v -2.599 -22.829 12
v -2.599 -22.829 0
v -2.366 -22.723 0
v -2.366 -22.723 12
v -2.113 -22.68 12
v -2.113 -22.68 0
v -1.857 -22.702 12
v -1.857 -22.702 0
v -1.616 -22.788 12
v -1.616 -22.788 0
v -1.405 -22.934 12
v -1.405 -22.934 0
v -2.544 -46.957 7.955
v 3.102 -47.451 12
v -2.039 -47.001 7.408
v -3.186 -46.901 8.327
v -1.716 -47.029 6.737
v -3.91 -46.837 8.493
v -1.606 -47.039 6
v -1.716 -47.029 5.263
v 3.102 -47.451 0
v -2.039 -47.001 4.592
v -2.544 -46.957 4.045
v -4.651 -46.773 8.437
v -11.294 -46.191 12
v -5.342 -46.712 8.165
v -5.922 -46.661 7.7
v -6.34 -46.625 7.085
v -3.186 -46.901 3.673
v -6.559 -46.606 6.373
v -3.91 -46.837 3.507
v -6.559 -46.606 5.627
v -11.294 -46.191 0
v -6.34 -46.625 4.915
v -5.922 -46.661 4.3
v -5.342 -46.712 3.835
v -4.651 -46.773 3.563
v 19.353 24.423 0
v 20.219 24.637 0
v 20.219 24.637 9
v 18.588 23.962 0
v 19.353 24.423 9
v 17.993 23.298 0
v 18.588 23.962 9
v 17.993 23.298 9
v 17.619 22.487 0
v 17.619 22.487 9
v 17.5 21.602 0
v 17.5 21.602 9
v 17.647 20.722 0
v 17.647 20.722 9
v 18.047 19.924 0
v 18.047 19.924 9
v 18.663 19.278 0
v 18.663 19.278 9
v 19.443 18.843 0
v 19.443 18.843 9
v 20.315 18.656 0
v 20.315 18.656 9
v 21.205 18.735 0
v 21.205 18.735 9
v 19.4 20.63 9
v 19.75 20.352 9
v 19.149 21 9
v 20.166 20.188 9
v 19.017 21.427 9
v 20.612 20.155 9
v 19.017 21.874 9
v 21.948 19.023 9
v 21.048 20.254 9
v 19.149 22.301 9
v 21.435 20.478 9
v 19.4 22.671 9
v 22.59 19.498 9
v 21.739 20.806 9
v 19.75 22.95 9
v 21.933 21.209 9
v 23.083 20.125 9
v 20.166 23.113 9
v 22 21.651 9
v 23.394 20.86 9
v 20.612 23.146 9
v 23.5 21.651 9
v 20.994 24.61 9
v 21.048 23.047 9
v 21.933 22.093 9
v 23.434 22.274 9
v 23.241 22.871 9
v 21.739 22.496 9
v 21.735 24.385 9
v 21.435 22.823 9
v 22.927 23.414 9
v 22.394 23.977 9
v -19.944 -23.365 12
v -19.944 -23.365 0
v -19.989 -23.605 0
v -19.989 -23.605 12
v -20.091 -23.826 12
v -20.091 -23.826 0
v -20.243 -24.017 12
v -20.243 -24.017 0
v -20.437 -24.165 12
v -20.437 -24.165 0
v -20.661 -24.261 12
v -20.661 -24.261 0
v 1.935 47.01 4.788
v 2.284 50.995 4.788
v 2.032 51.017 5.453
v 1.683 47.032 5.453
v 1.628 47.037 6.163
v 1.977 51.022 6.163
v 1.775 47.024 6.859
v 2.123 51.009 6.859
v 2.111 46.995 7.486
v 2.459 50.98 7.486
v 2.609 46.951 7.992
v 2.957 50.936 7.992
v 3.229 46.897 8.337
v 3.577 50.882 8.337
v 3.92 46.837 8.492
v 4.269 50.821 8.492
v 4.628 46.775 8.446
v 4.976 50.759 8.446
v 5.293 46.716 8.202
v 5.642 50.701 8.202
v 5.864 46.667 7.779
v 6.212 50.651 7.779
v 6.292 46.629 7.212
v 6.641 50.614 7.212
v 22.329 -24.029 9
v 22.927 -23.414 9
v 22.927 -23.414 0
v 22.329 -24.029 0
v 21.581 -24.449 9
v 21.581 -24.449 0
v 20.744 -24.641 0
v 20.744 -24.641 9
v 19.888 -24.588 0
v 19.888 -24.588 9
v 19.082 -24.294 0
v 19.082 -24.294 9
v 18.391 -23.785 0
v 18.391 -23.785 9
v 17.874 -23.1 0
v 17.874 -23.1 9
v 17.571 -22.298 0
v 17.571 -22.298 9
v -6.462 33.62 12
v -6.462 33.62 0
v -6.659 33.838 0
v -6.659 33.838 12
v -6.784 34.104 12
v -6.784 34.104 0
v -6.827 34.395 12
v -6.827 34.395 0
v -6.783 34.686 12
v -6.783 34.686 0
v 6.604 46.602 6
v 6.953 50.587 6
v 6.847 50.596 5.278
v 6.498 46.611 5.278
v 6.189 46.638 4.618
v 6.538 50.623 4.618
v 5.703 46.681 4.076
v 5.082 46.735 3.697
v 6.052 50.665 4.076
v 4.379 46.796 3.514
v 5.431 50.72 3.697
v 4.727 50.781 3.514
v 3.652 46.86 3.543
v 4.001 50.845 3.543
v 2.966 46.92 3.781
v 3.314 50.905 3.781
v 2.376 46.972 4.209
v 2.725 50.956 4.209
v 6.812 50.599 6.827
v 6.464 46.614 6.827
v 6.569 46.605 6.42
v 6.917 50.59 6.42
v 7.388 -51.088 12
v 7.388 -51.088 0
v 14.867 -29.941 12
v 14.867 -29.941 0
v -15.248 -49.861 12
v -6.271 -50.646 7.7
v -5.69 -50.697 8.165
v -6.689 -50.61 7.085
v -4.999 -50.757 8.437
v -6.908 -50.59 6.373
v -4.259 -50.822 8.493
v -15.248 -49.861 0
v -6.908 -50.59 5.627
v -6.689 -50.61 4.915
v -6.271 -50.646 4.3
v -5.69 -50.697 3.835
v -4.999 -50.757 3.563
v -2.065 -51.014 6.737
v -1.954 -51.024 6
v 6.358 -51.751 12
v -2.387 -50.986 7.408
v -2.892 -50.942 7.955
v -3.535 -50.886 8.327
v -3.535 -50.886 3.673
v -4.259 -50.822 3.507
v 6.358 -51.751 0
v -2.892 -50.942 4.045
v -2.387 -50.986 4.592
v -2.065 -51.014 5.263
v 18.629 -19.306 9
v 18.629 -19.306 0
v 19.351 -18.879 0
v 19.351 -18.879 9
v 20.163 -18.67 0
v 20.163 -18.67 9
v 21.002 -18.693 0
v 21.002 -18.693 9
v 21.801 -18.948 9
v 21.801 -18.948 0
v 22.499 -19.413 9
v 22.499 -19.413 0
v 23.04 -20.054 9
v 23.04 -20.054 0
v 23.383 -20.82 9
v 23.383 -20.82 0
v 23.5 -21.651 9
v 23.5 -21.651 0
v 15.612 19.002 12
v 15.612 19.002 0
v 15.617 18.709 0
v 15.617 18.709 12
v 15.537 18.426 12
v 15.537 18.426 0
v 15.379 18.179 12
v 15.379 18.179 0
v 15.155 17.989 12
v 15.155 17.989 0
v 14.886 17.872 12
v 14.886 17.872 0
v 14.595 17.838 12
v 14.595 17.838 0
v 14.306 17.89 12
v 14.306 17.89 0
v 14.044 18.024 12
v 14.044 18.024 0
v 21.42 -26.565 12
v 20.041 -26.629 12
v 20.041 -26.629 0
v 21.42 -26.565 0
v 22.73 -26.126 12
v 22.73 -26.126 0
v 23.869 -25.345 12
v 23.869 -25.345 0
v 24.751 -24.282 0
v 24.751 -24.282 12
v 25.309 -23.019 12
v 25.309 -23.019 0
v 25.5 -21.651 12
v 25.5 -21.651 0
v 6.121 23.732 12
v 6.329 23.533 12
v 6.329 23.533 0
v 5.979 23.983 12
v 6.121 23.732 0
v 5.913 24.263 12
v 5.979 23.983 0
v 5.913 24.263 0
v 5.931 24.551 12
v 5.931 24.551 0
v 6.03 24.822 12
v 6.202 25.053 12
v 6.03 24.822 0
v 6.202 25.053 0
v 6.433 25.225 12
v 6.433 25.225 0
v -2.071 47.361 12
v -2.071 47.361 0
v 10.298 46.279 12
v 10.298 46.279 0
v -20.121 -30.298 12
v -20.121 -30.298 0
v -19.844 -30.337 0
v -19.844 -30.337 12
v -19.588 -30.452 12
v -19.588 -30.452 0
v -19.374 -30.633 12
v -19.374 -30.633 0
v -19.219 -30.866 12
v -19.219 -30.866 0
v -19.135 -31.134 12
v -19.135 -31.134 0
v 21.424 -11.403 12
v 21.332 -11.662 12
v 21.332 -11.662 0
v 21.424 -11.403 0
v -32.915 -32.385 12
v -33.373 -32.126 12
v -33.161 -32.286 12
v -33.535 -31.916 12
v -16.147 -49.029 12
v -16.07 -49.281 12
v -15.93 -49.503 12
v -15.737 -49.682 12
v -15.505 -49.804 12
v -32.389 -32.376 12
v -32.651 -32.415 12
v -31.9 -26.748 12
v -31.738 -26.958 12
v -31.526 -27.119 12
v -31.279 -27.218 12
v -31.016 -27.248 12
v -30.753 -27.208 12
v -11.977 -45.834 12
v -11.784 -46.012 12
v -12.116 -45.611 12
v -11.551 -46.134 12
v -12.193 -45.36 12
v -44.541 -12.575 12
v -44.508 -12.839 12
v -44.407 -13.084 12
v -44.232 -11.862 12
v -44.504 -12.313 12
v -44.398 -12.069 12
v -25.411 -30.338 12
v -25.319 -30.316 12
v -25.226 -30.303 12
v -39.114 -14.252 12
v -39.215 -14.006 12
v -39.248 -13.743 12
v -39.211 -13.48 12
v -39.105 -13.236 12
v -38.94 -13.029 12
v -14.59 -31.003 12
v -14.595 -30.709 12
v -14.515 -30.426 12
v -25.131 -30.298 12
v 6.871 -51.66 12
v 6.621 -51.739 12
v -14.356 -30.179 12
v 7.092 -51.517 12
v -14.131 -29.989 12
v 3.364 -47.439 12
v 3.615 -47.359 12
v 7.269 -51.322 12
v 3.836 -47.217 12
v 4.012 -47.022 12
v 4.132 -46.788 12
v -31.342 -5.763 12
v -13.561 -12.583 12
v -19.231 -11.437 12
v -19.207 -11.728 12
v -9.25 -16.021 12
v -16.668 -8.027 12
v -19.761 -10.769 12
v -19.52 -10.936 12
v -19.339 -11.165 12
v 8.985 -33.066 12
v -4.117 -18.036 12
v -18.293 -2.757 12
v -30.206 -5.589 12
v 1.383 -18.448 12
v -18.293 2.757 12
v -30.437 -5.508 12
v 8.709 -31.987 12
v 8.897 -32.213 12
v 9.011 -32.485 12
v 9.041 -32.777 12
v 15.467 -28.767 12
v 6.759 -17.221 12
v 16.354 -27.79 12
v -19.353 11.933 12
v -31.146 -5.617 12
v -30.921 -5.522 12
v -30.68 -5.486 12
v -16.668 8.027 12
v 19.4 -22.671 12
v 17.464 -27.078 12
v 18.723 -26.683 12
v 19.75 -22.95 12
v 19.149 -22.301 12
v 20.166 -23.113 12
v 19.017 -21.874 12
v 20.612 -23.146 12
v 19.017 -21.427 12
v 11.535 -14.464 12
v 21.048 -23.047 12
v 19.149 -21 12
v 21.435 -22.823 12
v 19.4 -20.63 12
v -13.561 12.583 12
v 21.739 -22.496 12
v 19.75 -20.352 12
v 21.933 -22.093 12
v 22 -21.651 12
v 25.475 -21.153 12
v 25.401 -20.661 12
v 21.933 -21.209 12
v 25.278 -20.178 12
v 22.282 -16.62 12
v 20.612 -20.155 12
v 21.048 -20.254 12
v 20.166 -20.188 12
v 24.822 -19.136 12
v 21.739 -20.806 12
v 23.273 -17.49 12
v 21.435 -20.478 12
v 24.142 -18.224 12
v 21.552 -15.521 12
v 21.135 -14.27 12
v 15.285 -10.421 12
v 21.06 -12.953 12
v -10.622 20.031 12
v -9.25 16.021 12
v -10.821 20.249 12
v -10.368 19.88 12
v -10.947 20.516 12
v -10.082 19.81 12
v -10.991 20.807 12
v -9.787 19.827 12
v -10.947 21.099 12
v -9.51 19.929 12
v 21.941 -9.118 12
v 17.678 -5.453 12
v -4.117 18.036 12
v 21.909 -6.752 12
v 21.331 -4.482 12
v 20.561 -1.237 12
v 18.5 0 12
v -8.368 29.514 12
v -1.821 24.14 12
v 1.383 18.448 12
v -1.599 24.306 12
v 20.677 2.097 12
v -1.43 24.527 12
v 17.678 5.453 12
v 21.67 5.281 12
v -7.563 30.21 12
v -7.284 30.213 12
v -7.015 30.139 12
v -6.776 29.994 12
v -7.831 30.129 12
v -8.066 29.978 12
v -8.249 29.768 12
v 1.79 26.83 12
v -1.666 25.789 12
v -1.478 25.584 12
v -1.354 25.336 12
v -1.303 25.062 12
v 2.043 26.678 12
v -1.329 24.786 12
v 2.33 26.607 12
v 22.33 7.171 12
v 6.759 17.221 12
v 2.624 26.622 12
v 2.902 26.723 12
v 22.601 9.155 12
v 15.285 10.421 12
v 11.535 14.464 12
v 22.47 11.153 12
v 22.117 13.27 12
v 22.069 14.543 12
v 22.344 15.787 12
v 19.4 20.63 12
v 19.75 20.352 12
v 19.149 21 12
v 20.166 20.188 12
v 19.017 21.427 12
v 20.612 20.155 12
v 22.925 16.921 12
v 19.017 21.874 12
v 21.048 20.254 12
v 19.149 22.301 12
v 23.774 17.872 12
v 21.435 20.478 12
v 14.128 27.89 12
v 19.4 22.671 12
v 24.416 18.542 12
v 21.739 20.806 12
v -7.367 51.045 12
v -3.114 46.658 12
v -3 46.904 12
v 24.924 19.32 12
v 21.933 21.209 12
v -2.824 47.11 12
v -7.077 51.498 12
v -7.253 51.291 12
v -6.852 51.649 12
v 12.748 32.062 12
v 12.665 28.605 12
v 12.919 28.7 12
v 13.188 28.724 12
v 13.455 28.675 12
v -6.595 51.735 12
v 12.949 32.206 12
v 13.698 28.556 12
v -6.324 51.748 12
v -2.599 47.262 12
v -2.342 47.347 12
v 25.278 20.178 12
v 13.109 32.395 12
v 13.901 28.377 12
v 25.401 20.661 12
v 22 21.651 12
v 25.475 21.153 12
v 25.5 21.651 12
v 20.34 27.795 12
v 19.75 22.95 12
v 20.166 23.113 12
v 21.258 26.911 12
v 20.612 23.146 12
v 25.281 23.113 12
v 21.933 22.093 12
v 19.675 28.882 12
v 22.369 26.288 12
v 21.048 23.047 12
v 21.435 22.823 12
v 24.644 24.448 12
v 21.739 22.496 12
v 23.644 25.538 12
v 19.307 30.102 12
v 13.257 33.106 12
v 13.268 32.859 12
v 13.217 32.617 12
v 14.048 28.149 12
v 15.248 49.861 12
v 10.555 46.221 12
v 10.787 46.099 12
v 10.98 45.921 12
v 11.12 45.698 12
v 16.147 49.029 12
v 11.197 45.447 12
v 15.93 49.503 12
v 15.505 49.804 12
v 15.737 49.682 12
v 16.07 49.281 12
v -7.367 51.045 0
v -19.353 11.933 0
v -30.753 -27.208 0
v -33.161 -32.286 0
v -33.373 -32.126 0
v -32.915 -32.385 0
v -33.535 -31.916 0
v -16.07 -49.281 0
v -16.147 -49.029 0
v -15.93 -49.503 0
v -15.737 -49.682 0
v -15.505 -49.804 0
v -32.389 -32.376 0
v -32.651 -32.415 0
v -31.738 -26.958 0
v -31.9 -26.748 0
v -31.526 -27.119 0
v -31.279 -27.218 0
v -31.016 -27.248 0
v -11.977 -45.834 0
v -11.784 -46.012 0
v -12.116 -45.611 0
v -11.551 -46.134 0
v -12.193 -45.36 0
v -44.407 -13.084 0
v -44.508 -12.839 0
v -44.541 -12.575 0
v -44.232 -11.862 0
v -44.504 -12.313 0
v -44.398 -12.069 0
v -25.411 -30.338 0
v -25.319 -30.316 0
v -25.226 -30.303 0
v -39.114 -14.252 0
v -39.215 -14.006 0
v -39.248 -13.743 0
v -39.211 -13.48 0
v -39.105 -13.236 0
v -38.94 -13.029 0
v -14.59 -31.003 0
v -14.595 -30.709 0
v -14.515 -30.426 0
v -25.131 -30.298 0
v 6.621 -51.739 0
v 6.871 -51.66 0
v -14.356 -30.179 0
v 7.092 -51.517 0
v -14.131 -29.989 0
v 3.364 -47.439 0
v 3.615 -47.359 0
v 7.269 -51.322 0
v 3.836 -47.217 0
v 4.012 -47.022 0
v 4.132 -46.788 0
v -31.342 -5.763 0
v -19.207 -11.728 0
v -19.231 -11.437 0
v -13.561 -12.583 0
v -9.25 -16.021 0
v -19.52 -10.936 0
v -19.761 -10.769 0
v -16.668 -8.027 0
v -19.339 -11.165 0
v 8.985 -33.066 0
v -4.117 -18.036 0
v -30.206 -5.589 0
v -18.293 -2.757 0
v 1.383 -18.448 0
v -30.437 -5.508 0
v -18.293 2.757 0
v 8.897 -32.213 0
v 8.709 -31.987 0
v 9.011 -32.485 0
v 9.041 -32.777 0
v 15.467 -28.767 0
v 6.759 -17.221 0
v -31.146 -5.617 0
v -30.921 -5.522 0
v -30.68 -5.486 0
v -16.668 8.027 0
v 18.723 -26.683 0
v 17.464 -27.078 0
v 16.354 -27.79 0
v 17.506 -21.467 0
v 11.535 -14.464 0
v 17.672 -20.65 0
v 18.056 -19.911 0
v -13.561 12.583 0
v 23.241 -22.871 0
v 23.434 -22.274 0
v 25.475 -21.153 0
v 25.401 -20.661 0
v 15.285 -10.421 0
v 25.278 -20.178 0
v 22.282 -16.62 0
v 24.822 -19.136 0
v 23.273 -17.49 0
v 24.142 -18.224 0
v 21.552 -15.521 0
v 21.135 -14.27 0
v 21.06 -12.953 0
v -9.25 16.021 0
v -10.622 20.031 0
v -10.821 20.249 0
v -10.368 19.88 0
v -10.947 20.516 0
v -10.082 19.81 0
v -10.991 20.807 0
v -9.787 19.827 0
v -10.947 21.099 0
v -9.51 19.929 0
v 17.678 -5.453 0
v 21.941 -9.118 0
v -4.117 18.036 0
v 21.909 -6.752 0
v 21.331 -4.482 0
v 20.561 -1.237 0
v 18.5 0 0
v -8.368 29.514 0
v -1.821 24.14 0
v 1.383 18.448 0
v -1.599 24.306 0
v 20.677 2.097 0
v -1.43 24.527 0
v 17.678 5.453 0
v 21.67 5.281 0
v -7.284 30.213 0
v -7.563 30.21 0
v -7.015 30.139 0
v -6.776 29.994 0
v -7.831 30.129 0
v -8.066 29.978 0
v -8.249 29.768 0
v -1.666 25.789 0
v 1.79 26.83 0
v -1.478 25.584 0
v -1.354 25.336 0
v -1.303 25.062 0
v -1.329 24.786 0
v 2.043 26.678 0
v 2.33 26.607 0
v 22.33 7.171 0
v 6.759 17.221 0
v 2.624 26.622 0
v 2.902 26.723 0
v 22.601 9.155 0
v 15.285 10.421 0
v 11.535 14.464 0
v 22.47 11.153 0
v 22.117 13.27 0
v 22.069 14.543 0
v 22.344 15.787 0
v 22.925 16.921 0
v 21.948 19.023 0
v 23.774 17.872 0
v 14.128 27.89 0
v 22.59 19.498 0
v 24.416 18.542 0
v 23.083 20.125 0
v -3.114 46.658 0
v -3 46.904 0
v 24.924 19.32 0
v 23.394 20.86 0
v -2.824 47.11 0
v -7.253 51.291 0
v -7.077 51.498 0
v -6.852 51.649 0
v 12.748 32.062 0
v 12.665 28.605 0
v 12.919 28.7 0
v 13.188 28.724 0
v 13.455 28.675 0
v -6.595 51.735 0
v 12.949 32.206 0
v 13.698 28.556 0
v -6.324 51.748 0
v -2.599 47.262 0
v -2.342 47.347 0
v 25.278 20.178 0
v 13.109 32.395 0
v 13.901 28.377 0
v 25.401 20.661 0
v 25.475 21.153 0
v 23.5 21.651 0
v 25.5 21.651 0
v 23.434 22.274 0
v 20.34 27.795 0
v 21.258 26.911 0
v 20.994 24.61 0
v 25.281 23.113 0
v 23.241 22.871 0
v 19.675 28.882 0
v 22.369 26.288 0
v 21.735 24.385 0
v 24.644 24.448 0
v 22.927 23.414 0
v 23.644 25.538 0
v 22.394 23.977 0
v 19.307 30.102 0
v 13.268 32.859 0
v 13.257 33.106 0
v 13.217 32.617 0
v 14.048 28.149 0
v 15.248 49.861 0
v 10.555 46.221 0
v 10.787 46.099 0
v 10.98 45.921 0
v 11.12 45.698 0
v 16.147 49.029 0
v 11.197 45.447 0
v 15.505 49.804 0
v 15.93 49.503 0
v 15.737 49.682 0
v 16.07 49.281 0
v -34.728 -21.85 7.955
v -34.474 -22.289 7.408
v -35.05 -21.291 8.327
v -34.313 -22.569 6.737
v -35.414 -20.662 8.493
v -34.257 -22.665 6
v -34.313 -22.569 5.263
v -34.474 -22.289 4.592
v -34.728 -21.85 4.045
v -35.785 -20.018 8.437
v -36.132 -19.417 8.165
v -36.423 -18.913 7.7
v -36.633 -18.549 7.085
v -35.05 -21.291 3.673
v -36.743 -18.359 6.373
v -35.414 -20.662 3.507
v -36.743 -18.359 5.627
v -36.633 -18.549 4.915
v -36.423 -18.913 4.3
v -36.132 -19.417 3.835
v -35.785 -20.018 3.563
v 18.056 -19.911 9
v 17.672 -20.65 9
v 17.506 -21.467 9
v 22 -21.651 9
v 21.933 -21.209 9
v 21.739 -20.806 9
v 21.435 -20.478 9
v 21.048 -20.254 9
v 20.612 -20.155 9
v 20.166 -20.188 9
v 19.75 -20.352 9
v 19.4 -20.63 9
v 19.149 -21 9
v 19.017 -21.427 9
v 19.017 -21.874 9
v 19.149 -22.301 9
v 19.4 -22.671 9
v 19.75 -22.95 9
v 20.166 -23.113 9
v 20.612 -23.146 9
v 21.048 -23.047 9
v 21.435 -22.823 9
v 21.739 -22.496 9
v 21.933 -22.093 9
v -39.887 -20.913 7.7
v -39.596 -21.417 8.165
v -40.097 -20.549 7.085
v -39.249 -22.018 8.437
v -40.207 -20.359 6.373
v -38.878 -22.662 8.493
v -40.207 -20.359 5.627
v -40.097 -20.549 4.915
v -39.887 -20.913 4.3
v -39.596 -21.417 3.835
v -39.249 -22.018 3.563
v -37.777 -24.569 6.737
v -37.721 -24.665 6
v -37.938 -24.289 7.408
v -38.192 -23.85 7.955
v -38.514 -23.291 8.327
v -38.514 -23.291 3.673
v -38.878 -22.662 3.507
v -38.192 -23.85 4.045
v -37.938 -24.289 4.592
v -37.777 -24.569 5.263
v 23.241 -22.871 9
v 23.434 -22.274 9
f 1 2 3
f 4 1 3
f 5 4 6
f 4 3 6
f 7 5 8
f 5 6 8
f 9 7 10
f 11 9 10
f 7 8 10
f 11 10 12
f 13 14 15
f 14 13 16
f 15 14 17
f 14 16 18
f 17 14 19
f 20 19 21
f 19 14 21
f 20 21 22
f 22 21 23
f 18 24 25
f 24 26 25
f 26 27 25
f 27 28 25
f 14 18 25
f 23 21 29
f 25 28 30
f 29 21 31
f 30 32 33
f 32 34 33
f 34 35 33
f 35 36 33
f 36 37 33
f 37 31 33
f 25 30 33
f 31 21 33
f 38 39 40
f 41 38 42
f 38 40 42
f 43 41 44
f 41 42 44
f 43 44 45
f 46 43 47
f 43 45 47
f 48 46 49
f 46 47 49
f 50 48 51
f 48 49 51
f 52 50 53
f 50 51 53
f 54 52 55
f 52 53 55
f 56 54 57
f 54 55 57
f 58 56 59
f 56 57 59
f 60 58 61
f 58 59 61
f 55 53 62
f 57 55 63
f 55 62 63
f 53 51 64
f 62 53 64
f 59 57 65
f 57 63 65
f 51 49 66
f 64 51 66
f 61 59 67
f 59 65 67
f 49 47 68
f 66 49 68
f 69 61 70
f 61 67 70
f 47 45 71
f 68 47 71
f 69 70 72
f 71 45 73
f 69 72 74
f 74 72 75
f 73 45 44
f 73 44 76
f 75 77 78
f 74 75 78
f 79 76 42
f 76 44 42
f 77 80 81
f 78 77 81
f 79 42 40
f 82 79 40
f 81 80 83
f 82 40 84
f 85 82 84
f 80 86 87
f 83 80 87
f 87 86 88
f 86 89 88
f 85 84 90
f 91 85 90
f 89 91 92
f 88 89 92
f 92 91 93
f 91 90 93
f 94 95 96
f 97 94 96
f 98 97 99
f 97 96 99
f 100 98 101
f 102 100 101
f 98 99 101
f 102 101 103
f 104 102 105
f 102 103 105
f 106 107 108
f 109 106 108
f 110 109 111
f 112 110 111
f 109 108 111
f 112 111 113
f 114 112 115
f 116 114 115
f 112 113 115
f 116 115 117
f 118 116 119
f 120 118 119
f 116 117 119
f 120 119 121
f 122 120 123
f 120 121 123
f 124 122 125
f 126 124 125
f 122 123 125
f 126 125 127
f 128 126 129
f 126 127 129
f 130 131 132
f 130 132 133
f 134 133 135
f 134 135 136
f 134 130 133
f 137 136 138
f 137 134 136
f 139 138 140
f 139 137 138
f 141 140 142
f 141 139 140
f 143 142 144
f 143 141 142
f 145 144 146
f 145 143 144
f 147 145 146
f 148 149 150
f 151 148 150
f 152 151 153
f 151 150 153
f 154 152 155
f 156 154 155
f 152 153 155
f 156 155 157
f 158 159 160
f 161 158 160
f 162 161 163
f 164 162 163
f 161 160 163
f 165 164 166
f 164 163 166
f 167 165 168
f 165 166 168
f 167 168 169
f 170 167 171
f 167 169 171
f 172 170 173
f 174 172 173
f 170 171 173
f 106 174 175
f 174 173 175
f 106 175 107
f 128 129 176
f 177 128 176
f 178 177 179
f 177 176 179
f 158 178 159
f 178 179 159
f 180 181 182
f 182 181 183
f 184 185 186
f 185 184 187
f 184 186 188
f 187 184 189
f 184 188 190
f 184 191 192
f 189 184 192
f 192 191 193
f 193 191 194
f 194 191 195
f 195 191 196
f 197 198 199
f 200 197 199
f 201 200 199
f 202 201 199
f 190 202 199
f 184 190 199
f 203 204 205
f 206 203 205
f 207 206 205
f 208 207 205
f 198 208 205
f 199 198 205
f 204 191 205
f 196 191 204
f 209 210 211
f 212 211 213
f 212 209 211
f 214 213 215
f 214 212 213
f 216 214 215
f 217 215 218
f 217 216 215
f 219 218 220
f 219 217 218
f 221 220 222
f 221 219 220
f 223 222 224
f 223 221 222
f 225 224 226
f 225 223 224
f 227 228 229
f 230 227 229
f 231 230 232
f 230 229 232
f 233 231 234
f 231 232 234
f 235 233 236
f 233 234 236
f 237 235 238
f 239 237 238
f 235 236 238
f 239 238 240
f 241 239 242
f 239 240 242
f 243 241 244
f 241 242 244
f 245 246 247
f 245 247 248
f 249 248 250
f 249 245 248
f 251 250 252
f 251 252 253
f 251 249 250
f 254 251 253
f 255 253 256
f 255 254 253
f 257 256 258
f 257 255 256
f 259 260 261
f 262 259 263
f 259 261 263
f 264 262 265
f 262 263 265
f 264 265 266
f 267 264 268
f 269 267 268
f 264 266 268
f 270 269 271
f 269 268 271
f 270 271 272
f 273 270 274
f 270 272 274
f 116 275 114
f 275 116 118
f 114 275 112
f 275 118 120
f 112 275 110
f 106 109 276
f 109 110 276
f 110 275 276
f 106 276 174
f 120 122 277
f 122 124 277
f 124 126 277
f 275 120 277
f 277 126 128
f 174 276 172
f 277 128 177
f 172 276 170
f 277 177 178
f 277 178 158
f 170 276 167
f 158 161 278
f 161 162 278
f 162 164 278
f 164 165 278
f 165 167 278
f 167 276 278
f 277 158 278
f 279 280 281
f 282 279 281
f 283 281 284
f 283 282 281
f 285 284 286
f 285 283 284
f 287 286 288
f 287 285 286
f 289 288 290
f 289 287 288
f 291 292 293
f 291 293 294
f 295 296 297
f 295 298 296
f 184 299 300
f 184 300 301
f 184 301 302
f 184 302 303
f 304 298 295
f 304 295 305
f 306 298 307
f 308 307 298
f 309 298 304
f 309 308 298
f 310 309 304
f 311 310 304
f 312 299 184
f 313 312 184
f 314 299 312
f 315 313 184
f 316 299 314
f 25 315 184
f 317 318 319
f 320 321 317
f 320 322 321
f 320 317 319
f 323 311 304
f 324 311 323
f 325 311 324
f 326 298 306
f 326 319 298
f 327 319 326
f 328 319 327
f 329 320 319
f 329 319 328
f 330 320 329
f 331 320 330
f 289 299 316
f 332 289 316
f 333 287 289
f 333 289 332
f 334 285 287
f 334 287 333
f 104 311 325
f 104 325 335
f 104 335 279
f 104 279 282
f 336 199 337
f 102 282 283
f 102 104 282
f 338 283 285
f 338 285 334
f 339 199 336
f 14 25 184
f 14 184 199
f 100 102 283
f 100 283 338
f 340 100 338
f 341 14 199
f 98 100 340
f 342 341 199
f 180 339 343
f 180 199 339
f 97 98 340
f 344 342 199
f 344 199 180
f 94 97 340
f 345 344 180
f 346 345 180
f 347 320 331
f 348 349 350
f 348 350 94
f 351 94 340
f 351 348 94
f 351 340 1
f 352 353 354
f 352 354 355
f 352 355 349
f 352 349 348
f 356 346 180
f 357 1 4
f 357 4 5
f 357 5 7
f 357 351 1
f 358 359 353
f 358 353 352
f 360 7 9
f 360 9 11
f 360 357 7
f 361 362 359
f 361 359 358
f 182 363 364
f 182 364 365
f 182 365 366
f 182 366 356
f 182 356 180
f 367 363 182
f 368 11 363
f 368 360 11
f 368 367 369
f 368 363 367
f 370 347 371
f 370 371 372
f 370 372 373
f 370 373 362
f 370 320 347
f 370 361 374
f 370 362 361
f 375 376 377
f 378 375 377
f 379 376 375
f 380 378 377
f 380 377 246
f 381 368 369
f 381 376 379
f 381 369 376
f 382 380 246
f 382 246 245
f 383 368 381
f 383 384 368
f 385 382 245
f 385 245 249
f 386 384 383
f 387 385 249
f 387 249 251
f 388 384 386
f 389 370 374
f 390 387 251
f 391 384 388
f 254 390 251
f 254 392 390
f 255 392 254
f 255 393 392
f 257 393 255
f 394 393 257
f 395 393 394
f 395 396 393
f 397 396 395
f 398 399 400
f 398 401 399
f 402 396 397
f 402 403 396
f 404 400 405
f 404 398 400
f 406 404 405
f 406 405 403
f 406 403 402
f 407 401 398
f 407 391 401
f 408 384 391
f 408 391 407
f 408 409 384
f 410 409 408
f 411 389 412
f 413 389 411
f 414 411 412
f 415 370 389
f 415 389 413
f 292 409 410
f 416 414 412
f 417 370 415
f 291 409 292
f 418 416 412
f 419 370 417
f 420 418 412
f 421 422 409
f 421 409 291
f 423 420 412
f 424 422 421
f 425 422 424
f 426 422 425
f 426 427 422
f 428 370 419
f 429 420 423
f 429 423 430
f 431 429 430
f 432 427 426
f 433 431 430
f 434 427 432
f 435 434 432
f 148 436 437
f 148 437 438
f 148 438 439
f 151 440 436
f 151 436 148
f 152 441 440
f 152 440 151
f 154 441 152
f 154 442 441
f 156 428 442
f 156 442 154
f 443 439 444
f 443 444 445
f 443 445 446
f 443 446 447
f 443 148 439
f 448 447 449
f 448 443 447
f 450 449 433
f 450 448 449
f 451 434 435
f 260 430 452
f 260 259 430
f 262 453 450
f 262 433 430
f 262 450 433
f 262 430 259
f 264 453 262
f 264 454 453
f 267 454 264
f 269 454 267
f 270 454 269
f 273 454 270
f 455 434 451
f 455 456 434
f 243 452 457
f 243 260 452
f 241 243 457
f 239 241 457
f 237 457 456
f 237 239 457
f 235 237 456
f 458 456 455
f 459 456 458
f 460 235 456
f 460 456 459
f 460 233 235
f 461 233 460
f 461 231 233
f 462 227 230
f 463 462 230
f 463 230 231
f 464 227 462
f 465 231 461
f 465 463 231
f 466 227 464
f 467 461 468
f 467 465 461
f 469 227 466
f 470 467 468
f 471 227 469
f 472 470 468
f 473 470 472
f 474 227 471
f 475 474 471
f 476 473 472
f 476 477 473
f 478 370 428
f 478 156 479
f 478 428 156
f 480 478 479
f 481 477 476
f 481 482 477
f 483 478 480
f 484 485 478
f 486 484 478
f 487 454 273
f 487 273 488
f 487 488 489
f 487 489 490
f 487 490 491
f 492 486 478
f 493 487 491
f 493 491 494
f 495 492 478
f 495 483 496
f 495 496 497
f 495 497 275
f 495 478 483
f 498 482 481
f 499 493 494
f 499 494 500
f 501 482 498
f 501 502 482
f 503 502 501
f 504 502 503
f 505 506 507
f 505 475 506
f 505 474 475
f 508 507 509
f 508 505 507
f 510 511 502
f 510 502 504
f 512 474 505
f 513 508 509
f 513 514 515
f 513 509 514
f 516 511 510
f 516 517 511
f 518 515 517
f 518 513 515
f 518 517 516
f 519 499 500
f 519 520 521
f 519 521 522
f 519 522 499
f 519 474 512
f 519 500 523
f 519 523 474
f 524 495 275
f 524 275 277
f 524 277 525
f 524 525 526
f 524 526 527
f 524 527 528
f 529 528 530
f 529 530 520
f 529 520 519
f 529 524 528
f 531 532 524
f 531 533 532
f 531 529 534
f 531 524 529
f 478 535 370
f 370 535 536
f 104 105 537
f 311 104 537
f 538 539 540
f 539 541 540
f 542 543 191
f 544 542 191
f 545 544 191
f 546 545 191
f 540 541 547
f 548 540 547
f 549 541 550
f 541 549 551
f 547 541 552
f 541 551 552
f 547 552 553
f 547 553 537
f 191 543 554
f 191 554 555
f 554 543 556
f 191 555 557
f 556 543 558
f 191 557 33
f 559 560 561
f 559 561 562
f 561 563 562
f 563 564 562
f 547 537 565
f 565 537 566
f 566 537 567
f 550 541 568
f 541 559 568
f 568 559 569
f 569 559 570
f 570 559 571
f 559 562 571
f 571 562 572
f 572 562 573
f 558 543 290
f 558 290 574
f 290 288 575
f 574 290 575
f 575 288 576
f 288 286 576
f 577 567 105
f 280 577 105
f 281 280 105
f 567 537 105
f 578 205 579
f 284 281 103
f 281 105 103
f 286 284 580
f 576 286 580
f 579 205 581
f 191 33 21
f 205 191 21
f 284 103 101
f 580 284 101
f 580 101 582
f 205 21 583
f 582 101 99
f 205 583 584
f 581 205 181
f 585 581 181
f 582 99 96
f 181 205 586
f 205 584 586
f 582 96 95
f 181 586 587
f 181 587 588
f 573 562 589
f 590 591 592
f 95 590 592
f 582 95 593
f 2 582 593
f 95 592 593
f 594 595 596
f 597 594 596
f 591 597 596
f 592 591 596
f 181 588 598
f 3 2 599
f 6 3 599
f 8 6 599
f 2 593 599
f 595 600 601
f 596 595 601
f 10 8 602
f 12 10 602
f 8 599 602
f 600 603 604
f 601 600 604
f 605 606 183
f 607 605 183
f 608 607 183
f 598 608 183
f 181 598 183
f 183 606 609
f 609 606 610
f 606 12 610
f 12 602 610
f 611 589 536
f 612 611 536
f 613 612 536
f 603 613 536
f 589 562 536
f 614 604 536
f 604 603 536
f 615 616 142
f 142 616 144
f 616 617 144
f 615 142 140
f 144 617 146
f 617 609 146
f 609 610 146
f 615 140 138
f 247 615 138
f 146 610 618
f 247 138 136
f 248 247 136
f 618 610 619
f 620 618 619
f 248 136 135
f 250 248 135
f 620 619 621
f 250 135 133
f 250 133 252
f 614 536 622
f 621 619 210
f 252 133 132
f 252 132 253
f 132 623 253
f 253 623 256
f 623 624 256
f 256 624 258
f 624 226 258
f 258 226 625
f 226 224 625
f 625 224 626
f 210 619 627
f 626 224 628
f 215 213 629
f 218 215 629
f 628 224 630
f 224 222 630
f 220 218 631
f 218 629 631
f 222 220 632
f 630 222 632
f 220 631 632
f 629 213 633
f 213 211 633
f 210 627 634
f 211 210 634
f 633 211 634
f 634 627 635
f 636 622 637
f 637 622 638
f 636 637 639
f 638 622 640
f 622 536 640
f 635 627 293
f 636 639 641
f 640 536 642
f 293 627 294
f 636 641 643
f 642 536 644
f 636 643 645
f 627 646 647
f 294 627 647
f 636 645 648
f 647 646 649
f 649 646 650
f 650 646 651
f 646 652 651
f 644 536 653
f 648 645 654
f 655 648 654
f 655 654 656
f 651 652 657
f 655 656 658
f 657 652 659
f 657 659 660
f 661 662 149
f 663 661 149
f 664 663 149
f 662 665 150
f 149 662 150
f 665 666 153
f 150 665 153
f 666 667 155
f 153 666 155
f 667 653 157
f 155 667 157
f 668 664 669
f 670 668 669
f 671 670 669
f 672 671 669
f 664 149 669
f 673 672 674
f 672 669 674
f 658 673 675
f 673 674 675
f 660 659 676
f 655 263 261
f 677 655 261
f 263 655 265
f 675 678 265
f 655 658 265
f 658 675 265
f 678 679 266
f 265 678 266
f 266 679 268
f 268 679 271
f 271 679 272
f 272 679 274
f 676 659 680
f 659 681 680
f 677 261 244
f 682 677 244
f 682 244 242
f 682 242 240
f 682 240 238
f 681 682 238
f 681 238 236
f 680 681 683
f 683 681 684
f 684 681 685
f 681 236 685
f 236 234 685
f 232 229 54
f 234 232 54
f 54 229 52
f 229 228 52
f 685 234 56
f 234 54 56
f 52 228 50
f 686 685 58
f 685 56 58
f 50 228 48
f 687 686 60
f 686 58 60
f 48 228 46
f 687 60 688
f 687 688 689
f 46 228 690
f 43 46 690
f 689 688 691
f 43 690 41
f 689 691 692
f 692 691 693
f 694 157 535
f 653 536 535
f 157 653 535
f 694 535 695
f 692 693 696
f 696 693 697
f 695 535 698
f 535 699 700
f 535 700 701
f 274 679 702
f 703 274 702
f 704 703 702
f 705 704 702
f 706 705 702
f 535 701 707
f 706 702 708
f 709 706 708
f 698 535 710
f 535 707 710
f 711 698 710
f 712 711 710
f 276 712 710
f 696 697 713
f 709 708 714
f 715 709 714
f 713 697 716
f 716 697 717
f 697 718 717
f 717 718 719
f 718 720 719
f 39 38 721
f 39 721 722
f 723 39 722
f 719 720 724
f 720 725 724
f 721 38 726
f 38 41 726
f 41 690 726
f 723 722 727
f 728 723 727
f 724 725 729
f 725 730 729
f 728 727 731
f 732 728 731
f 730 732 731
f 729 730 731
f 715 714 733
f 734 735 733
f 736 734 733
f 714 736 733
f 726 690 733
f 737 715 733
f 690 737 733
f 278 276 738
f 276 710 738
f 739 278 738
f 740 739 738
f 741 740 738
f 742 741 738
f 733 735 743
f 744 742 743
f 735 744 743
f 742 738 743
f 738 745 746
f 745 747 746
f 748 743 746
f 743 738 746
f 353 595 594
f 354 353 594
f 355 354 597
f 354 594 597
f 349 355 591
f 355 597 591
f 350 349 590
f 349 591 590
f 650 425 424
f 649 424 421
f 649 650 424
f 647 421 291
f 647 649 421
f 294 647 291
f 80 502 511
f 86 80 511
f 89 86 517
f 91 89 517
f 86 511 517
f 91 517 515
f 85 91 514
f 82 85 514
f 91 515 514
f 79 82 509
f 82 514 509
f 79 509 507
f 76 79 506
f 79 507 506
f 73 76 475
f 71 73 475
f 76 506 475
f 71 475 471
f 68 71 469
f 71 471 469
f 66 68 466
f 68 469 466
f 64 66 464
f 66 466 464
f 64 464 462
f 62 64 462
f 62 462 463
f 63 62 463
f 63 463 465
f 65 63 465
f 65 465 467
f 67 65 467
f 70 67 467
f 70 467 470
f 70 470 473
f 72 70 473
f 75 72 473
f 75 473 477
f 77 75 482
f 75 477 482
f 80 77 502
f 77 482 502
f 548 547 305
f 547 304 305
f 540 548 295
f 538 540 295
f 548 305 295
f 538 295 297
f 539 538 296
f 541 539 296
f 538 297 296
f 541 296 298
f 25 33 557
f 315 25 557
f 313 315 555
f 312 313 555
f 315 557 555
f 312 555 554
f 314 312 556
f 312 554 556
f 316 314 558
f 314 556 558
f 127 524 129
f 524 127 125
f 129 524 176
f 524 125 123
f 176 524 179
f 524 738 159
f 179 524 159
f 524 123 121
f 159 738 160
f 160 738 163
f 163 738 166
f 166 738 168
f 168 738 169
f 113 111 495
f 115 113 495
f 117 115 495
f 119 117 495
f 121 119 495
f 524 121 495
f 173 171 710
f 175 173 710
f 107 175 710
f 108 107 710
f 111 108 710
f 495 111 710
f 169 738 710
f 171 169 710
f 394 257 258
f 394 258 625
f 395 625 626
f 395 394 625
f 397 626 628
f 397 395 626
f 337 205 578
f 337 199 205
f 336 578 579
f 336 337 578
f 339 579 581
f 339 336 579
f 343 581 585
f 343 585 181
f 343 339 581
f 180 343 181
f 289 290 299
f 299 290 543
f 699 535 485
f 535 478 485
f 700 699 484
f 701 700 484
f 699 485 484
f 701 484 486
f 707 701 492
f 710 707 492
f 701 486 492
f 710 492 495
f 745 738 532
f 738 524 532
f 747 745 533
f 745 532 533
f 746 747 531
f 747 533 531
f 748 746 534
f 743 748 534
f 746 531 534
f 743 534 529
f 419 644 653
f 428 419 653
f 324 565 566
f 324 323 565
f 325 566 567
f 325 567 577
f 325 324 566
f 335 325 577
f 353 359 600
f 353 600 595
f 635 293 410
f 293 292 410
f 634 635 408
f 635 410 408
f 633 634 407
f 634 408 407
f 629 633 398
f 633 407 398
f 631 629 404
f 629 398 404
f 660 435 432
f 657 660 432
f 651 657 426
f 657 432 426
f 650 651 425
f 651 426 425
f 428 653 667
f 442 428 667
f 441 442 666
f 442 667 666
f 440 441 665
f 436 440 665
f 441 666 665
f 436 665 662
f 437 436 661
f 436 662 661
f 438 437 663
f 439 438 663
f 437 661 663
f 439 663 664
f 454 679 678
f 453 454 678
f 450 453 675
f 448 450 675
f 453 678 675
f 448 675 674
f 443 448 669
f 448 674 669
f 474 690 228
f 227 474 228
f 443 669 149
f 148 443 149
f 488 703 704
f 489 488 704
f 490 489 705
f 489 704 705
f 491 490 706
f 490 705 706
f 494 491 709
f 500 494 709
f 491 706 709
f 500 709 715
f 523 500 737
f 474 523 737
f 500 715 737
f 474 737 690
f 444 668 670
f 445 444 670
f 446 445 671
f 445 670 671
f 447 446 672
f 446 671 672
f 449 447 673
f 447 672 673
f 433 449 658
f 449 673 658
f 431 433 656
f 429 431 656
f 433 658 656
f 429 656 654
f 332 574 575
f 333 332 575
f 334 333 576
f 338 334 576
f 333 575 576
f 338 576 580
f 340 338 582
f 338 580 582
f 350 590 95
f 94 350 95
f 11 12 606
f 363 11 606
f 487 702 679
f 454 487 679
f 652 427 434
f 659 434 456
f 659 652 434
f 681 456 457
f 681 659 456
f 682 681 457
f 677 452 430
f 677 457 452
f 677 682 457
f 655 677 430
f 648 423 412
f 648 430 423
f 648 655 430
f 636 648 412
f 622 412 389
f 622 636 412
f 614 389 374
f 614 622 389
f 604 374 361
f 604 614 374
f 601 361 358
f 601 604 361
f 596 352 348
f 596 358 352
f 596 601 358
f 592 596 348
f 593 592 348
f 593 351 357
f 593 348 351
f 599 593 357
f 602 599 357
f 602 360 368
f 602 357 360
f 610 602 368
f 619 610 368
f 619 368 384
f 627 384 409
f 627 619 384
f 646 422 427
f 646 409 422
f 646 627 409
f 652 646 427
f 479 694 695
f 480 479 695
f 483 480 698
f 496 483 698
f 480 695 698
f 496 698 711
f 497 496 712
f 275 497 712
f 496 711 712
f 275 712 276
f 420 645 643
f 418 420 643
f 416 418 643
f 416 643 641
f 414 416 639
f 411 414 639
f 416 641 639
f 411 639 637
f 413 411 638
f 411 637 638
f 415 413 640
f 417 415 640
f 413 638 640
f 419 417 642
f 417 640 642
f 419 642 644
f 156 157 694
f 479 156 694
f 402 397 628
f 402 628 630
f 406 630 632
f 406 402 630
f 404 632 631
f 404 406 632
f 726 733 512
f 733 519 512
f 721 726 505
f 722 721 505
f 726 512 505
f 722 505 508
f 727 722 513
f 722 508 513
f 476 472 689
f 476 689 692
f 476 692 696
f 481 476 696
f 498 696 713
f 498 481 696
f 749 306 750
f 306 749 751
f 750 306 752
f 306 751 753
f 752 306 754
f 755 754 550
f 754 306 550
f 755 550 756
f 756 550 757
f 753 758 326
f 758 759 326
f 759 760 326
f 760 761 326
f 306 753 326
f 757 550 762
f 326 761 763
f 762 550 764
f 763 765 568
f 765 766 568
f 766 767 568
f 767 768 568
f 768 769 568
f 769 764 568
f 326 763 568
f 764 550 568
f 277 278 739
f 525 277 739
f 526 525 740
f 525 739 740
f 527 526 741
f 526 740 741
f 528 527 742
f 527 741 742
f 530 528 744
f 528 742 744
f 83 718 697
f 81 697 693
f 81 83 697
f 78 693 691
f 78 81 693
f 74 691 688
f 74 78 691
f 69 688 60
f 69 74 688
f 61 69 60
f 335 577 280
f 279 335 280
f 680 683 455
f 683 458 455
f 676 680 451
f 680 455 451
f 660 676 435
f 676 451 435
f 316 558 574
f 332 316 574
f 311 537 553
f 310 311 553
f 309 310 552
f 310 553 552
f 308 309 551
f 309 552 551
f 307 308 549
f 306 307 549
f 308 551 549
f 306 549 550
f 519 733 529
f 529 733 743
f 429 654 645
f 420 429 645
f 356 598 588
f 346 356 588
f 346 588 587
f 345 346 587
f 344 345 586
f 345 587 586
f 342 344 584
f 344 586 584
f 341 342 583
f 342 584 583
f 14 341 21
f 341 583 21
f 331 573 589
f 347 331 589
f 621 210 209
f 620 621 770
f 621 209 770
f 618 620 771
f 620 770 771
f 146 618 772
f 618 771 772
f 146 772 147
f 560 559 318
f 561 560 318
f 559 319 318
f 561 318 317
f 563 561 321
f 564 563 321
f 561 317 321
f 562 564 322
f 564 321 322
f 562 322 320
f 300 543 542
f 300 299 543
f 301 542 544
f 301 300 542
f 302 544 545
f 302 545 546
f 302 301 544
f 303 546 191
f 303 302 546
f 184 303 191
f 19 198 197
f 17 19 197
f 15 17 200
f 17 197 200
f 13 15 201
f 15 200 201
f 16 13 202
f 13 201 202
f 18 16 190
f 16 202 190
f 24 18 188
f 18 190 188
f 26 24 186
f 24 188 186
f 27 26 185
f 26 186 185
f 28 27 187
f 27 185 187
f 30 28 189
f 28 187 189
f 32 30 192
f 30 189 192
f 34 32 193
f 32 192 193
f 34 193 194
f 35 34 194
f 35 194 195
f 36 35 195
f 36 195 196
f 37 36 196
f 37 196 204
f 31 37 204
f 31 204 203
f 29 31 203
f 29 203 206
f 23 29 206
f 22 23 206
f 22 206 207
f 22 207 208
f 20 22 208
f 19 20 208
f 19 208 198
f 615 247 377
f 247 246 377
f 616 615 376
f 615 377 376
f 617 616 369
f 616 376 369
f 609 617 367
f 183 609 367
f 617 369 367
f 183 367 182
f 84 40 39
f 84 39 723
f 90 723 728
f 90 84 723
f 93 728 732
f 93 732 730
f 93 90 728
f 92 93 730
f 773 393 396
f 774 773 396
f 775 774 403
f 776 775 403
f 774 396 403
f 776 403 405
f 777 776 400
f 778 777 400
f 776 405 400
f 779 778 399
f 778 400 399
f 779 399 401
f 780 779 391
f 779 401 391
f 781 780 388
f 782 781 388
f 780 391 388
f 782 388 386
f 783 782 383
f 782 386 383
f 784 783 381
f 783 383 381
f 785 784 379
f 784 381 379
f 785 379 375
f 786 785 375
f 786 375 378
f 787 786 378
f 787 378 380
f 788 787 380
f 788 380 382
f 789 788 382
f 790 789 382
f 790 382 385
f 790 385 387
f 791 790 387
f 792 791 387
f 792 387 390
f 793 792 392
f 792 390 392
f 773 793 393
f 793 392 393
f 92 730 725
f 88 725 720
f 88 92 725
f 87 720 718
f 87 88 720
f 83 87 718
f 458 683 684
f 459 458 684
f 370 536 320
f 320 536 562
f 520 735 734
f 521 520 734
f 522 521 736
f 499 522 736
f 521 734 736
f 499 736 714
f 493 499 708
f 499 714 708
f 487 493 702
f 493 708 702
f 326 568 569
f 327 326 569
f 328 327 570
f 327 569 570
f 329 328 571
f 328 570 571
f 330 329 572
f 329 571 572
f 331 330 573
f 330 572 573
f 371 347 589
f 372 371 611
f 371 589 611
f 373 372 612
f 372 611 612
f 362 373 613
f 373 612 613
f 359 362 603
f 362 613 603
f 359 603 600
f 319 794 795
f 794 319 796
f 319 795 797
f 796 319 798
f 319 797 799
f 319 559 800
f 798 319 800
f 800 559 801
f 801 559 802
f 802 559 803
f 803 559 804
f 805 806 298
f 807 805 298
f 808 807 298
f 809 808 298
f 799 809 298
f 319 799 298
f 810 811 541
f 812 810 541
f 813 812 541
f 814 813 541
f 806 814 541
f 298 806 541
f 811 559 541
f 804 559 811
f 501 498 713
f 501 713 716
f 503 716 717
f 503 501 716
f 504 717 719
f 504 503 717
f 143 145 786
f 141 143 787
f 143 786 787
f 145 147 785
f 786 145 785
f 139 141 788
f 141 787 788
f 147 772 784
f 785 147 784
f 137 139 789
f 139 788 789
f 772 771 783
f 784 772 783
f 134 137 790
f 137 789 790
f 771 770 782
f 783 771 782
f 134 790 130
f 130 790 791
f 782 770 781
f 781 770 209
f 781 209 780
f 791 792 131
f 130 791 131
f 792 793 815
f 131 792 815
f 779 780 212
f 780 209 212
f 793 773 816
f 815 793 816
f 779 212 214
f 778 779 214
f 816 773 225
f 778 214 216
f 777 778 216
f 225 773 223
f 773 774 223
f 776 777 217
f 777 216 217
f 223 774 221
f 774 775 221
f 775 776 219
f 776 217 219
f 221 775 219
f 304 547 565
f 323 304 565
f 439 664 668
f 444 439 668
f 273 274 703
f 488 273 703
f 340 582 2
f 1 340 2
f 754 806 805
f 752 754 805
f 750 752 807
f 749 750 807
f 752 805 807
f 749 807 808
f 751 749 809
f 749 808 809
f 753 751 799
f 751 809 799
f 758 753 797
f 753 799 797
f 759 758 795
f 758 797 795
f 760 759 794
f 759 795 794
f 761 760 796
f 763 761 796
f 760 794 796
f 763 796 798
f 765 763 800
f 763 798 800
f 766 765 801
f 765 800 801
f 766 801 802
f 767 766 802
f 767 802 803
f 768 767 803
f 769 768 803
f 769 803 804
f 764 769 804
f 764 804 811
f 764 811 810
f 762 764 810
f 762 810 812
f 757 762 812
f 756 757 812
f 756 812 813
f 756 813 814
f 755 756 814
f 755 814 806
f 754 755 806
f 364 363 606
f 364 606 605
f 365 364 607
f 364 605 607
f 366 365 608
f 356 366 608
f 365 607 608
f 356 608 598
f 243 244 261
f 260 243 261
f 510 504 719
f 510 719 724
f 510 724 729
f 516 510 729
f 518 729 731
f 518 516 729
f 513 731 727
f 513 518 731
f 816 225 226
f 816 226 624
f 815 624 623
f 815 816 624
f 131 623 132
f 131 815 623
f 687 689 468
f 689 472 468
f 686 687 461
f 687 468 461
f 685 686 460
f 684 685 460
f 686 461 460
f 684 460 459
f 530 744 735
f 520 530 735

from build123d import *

# Parameters (mm, degrees)
BOSS_EXTRUDE1_DEPTH = 12
SKETCH2_5_R         = 18.5
CUT_EXTRUDE1_DEPTH  = 70.542748898
CUT_EXTRUDE2_DEPTH  = 70.542748898
FILLET2_R           = 1
SKETCH5_R           = 2.5
CUT_EXTRUDE3_DEPTH  = 20
SKETCH6_R           = 2.5
CUT_EXTRUDE4_DEPTH  = 20
SKETCH7_R           = 2.5
CUT_EXTRUDE5_DEPTH  = 20
SKETCH8_R           = 3
CUT_EXTRUDE6_DEPTH  = 12
SKETCH8_5_R         = 5
SKETCH8_5_R_2       = 3
BOSS_EXTRUDE3_DEPTH = 12
SKETCH8_6_R         = 3
BOSS_EXTRUDE4_DEPTH = 3
SKETCH8_7_R         = 1.5
CUT_EXTRUDE7_DEPTH  = 3
CUT_EXTRUDE8_DEPTH  = 12
FILLET3_R           = 10
FILLET4_R           = 5


with BuildPart() as part:
    # Sketch2 → Boss-Extrude1 (new body)
    with BuildSketch(Plane.XY):
        with BuildLine():
            Line((23.672407308, 3.951851747), (16.019679306, 49.793271382))
            Line((16.019679306, 49.793271382), (-7.129793546, 51.818587823))
            Line((-7.129793546, 51.818587823), (-19.353009621, 11.93281278))
            Line((-19.353009621, 11.93281278), (-44.799864735, -12.404358107))
            Line((-44.799864735, -12.404358107), (-33.142421606, -32.595641893))
            Line((-33.142421606, -32.595641893), (-25.274162816, -30.298243696))
            Line((-25.274162816, -30.298243696), (-19.274162816, -30.298243696))
            Line((-19.274162816, -30.298243696), (-16.019679306, -49.793271382))
            Line((-16.019679306, -49.793271382), (7.129793546, -51.818587823))
            Line((7.129793546, -51.818587823), (22.626538395, -8.00248463))
            ThreePointArc((22.626538395, -8.00248463), (23.908672754, -2.091737826), (23.672407308, 3.951851747))
        make_face()
    extrude(amount=BOSS_EXTRUDE1_DEPTH)

    # Sketch2<5> → Cut-Extrude1 (cut, through all)
    with BuildSketch(Plane.XY):
        Circle(SKETCH2_5_R)
    extrude(amount=CUT_EXTRUDE1_DEPTH, mode=Mode.SUBTRACT)

    # Sketch4 → Cut-Extrude2 (cut, through all)
    with BuildSketch(Plane(origin=(0, 0, 0), x_dir=(-1, 0, 0), z_dir=(0, 0, -1))):
        with BuildLine():
            Line((31.89963382, -26.74821348), (39.11444929, -14.25178652))
            ThreePointArc((39.11444929, -14.25178652), (39.238352753, -13.610220853), (38.939597601, -13.029097861))
            Line((38.939597601, -13.029097861), (31.34175024, -5.762576762))
            ThreePointArc((31.34175024, -5.762576762), (30.801372994, -5.49670059), (30.206302215, -5.589374614))
            Line((30.206302215, -5.589374614), (19.760621938, -10.769411482))
            ThreePointArc((19.760621938, -10.769411482), (19.338870845, -11.165302288), (19.206894896, -11.728494852))
            Line((19.206894896, -11.728494852), (19.943691515, -23.364737765))
            ThreePointArc((19.943691515, -23.364737765), (20.160968845, -23.92642119), (20.661412988, -24.261463526))
            Line((20.661412988, -24.261463526), (30.753328537, -27.208131805))
            ThreePointArc((30.753328537, -27.208131805), (31.405973387, -27.176299861), (31.89963382, -26.74821348))
        make_face()
        with BuildLine():
            Line((-3.101588581, -47.450886204), (11.294228399, -46.191415416))
            ThreePointArc((11.294228399, -46.191415416), (11.886017494, -45.929410004), (12.193422961, -45.359881208))
            Line((12.193422961, -45.359881208), (14.590124654, -31.003143578))
            ThreePointArc((14.590124654, -31.003143578), (14.514860423, -30.426266922), (14.131237853, -29.988905397))
            Line((14.131237853, -29.988905397), (2.599081353, -22.829122685))
            ThreePointArc((2.599081353, -22.829122685), (1.984462107, -22.682505678), (1.404640085, -22.933622755))
            Line((1.404640085, -22.933622755), (-8.709033825, -31.987170241))
            ThreePointArc((-8.709033825, -31.987170241), (-9.010881274, -32.484502622), (-8.984828493, -33.065684721))
            Line((-8.984828493, -33.065684721), (-4.131516756, -46.788128366))
            ThreePointArc((-4.131516756, -46.788128366), (-3.729883832, -47.29562434), (-3.101588581, -47.450886204))
        make_face()
        with BuildLine():
            ThreePointArc((3.114153375, 46.657522219), (2.716960749, 47.193739619), (2.070886855, 47.360711488))
            Line((2.070886855, 47.360711488), (-10.298033701, 46.278571159))
            ThreePointArc((-10.298033701, 46.278571159), (-10.889822796, 46.016565746), (-11.197228262, 45.447036951))
            Line((-11.197228262, 45.447036951), (-13.257459336, 33.105827753))
            ThreePointArc((-13.257459336, 33.105827753), (-13.169697178, 32.50237421), (-12.747787491, 32.062089538))
            Line((-12.747787491, 32.062089538), (-2.901922388, 26.723185283))
            ThreePointArc((-2.901922388, 26.723185283), (-2.329564655, 26.606850793), (-1.789845714, 26.830078374))
            Line((-1.789845714, 26.830078374), (6.462299158, 33.620420858))
            ThreePointArc((6.462299158, 33.620420858), (6.784440856, 34.104304755), (6.78301172, 34.68561092))
            Line((6.78301172, 34.68561092), (3.114153375, 46.657522219))
        make_face()
        with BuildLine():
            Line((-6.433365024, 25.225436758), (-12.665126119, 28.604599024))
            ThreePointArc((-12.665126119, 28.604599024), (-13.580597632, 28.624109445), (-14.128154883, 27.890181789))
            Line((-14.128154883, 27.890181789), (-15.611926917, 19.002081175))
            ThreePointArc((-15.611926917, 19.002081175), (-15.15512906, 17.989143487), (-14.044489067, 18.023579629))
            Line((-14.044489067, 18.023579629), (-6.328955938, 23.532517977))
            ThreePointArc((-6.328955938, 23.532517977), (-5.911939917, 24.40791608), (-6.433365024, 25.225436758))
        make_face()
        with BuildLine():
            Line((6.77622527, 29.993656239), (1.666391597, 25.788989304))
            ThreePointArc((1.666391597, 25.788989304), (1.306181331, 24.923189755), (1.821469633, 24.139711446))
            Line((1.821469633, 24.139711446), (9.510194745, 19.929155813))
            ThreePointArc((9.510194745, 19.929155813), (10.622081934, 20.030927743), (10.946625701, 21.099254467))
            Line((10.946625701, 21.099254467), (8.367734263, 29.514477034))
            ThreePointArc((8.367734263, 29.514477034), (7.699924222, 30.179011518), (6.77622527, 29.993656239))
        make_face()
    extrude(amount=-CUT_EXTRUDE2_DEPTH, mode=Mode.SUBTRACT)

    # Fillet2
    fillet2_edges = [part.edges().sort_by_distance(p)[0] for p in [
        (7.129793546, -51.818587823, 6),
        (-16.019679306, -49.793271382, 6),
        (-25.274162816, -30.298243696, 6),
        (-19.274162816, -30.298243696, 6),
        (-33.142421606, -32.595641893, 6),
        (-44.799864735, -12.404358107, 6),
        (-7.129793546, 51.818587823, 6),
        (16.019679306, 49.793271382, 6),
    ]]
    fillet(fillet2_edges, radius=FILLET2_R)

    # Sketch5 → Cut-Extrude3 (cut)
    with BuildSketch(Plane(origin=(-4.44494288, -50.805929603, 0), x_dir=(0.9961946980917458, -0.08715574274765547, 0), z_dir=(-0.08715574274765547, -0.9961946980917458, 0))):
        with Locations((0, 6)):
            Circle(SKETCH5_R)
    extrude(amount=-CUT_EXTRUDE3_DEPTH, mode=Mode.SUBTRACT)

    # Sketch6 → Cut-Extrude4 (cut)
    with BuildSketch(Plane(origin=(-38.97114317, -22.5, 0), x_dir=(0.5000000000000013, -0.8660254037844379, 0), z_dir=(-0.8660254037844378, -0.5000000000000012, 0))):
        with Locations((0, 6)):
            Circle(SKETCH6_R)
    extrude(amount=-CUT_EXTRUDE4_DEPTH, mode=Mode.SUBTRACT)

    # Sketch7 → Cut-Extrude5 (cut)
    with BuildSketch(Plane(origin=(4.44494288, 50.805929603, 0), x_dir=(0.9961946980917453, -0.08715574274766227, 0), z_dir=(0.08715574274766227, 0.9961946980917453, 0))):
        with Locations((0.01731942, -6)):
            Circle(SKETCH7_R)
    extrude(amount=-CUT_EXTRUDE5_DEPTH, mode=Mode.SUBTRACT)

    # Sketch8 → Cut-Extrude6 (cut)
    with BuildSketch(Plane.XY.offset(12)):
        with Locations((20.5, 21.650635095)):
            Circle(SKETCH8_R)
        with Locations((20.5, -21.650635095)):
            Circle(SKETCH8_R)
    extrude(amount=-CUT_EXTRUDE6_DEPTH, mode=Mode.SUBTRACT)

    # Sketch8<5> → Boss-Extrude3 (add)
    # profile 1 of 2: a face of its own
    with BuildSketch(Plane.XY.offset(12)):
        with Locations((20.5, 21.650635095)):
            Circle(SKETCH8_5_R)
        with Locations((20.5, 21.650635095)):
            Circle(SKETCH8_5_R_2, mode=Mode.SUBTRACT)
    # profile 2 of 2: a face of its own
    with BuildSketch(Plane.XY.offset(12)):
        with Locations((20.5, -21.650635095)):
            Circle(SKETCH8_5_R)
        with Locations((20.5, -21.650635095)):
            Circle(SKETCH8_5_R_2, mode=Mode.SUBTRACT)
    extrude(amount=-BOSS_EXTRUDE3_DEPTH)

    # Sketch8<6> → Boss-Extrude4 (add)
    with BuildSketch(Plane.XY.offset(12)):
        with Locations((20.5, 21.650635095)):
            Circle(SKETCH8_6_R)
        with Locations((20.5, -21.650635095)):
            Circle(SKETCH8_6_R)
    extrude(amount=-BOSS_EXTRUDE4_DEPTH)

    # Sketch8<7> → Cut-Extrude7 (cut)
    with BuildSketch(Plane.XY.offset(12)):
        with Locations((20.5, 21.650635095)):
            Circle(SKETCH8_7_R)
        with Locations((20.5, -21.650635095)):
            Circle(SKETCH8_7_R)
    extrude(amount=-CUT_EXTRUDE7_DEPTH, mode=Mode.SUBTRACT)

    # Sketch8<8> → Cut-Extrude8 (cut)
    with BuildSketch(Plane.XY.offset(12)):
        with BuildLine():
            ThreePointArc((30.976333892, 12.335103384), (26.75, 10.825317547), (23.329320166, 7.92009795))
            ThreePointArc((23.329320166, 7.92009795), (20.5, 0), (23.329320166, -7.92009795))
            ThreePointArc((23.329320166, -7.92009795), (26.75, -10.825317547), (30.976333892, -12.335103384))
            ThreePointArc((30.976333892, -12.335103384), (41.091791323, -9.527481996), (45.5, 0))
            ThreePointArc((45.5, 0), (41.091791323, 9.527481996), (30.976333892, 12.335103384))
        make_face()
    extrude(amount=-CUT_EXTRUDE8_DEPTH, mode=Mode.SUBTRACT)

    # Fillet3
    fillet3_edges = [part.edges().sort_by_distance(p)[0] for p in [
        (22.859848485, -7.309399924, 6),
        (23.065610114, 7.586692137, 6),
    ]]
    fillet(fillet3_edges, radius=FILLET3_R)

    # Fillet4
    fillet4_edges = [part.edges().sort_by_distance(p)[0] for p in [
        (16.664875992, -24.85872235, 6),
        (19.534612283, -16.744717591, 6),
        (19.889340166, 26.613204446, 6),
        (21.534424697, 16.758808693, 6),
    ]]
    fillet(fillet4_edges, radius=FILLET4_R)


solid = part.part
